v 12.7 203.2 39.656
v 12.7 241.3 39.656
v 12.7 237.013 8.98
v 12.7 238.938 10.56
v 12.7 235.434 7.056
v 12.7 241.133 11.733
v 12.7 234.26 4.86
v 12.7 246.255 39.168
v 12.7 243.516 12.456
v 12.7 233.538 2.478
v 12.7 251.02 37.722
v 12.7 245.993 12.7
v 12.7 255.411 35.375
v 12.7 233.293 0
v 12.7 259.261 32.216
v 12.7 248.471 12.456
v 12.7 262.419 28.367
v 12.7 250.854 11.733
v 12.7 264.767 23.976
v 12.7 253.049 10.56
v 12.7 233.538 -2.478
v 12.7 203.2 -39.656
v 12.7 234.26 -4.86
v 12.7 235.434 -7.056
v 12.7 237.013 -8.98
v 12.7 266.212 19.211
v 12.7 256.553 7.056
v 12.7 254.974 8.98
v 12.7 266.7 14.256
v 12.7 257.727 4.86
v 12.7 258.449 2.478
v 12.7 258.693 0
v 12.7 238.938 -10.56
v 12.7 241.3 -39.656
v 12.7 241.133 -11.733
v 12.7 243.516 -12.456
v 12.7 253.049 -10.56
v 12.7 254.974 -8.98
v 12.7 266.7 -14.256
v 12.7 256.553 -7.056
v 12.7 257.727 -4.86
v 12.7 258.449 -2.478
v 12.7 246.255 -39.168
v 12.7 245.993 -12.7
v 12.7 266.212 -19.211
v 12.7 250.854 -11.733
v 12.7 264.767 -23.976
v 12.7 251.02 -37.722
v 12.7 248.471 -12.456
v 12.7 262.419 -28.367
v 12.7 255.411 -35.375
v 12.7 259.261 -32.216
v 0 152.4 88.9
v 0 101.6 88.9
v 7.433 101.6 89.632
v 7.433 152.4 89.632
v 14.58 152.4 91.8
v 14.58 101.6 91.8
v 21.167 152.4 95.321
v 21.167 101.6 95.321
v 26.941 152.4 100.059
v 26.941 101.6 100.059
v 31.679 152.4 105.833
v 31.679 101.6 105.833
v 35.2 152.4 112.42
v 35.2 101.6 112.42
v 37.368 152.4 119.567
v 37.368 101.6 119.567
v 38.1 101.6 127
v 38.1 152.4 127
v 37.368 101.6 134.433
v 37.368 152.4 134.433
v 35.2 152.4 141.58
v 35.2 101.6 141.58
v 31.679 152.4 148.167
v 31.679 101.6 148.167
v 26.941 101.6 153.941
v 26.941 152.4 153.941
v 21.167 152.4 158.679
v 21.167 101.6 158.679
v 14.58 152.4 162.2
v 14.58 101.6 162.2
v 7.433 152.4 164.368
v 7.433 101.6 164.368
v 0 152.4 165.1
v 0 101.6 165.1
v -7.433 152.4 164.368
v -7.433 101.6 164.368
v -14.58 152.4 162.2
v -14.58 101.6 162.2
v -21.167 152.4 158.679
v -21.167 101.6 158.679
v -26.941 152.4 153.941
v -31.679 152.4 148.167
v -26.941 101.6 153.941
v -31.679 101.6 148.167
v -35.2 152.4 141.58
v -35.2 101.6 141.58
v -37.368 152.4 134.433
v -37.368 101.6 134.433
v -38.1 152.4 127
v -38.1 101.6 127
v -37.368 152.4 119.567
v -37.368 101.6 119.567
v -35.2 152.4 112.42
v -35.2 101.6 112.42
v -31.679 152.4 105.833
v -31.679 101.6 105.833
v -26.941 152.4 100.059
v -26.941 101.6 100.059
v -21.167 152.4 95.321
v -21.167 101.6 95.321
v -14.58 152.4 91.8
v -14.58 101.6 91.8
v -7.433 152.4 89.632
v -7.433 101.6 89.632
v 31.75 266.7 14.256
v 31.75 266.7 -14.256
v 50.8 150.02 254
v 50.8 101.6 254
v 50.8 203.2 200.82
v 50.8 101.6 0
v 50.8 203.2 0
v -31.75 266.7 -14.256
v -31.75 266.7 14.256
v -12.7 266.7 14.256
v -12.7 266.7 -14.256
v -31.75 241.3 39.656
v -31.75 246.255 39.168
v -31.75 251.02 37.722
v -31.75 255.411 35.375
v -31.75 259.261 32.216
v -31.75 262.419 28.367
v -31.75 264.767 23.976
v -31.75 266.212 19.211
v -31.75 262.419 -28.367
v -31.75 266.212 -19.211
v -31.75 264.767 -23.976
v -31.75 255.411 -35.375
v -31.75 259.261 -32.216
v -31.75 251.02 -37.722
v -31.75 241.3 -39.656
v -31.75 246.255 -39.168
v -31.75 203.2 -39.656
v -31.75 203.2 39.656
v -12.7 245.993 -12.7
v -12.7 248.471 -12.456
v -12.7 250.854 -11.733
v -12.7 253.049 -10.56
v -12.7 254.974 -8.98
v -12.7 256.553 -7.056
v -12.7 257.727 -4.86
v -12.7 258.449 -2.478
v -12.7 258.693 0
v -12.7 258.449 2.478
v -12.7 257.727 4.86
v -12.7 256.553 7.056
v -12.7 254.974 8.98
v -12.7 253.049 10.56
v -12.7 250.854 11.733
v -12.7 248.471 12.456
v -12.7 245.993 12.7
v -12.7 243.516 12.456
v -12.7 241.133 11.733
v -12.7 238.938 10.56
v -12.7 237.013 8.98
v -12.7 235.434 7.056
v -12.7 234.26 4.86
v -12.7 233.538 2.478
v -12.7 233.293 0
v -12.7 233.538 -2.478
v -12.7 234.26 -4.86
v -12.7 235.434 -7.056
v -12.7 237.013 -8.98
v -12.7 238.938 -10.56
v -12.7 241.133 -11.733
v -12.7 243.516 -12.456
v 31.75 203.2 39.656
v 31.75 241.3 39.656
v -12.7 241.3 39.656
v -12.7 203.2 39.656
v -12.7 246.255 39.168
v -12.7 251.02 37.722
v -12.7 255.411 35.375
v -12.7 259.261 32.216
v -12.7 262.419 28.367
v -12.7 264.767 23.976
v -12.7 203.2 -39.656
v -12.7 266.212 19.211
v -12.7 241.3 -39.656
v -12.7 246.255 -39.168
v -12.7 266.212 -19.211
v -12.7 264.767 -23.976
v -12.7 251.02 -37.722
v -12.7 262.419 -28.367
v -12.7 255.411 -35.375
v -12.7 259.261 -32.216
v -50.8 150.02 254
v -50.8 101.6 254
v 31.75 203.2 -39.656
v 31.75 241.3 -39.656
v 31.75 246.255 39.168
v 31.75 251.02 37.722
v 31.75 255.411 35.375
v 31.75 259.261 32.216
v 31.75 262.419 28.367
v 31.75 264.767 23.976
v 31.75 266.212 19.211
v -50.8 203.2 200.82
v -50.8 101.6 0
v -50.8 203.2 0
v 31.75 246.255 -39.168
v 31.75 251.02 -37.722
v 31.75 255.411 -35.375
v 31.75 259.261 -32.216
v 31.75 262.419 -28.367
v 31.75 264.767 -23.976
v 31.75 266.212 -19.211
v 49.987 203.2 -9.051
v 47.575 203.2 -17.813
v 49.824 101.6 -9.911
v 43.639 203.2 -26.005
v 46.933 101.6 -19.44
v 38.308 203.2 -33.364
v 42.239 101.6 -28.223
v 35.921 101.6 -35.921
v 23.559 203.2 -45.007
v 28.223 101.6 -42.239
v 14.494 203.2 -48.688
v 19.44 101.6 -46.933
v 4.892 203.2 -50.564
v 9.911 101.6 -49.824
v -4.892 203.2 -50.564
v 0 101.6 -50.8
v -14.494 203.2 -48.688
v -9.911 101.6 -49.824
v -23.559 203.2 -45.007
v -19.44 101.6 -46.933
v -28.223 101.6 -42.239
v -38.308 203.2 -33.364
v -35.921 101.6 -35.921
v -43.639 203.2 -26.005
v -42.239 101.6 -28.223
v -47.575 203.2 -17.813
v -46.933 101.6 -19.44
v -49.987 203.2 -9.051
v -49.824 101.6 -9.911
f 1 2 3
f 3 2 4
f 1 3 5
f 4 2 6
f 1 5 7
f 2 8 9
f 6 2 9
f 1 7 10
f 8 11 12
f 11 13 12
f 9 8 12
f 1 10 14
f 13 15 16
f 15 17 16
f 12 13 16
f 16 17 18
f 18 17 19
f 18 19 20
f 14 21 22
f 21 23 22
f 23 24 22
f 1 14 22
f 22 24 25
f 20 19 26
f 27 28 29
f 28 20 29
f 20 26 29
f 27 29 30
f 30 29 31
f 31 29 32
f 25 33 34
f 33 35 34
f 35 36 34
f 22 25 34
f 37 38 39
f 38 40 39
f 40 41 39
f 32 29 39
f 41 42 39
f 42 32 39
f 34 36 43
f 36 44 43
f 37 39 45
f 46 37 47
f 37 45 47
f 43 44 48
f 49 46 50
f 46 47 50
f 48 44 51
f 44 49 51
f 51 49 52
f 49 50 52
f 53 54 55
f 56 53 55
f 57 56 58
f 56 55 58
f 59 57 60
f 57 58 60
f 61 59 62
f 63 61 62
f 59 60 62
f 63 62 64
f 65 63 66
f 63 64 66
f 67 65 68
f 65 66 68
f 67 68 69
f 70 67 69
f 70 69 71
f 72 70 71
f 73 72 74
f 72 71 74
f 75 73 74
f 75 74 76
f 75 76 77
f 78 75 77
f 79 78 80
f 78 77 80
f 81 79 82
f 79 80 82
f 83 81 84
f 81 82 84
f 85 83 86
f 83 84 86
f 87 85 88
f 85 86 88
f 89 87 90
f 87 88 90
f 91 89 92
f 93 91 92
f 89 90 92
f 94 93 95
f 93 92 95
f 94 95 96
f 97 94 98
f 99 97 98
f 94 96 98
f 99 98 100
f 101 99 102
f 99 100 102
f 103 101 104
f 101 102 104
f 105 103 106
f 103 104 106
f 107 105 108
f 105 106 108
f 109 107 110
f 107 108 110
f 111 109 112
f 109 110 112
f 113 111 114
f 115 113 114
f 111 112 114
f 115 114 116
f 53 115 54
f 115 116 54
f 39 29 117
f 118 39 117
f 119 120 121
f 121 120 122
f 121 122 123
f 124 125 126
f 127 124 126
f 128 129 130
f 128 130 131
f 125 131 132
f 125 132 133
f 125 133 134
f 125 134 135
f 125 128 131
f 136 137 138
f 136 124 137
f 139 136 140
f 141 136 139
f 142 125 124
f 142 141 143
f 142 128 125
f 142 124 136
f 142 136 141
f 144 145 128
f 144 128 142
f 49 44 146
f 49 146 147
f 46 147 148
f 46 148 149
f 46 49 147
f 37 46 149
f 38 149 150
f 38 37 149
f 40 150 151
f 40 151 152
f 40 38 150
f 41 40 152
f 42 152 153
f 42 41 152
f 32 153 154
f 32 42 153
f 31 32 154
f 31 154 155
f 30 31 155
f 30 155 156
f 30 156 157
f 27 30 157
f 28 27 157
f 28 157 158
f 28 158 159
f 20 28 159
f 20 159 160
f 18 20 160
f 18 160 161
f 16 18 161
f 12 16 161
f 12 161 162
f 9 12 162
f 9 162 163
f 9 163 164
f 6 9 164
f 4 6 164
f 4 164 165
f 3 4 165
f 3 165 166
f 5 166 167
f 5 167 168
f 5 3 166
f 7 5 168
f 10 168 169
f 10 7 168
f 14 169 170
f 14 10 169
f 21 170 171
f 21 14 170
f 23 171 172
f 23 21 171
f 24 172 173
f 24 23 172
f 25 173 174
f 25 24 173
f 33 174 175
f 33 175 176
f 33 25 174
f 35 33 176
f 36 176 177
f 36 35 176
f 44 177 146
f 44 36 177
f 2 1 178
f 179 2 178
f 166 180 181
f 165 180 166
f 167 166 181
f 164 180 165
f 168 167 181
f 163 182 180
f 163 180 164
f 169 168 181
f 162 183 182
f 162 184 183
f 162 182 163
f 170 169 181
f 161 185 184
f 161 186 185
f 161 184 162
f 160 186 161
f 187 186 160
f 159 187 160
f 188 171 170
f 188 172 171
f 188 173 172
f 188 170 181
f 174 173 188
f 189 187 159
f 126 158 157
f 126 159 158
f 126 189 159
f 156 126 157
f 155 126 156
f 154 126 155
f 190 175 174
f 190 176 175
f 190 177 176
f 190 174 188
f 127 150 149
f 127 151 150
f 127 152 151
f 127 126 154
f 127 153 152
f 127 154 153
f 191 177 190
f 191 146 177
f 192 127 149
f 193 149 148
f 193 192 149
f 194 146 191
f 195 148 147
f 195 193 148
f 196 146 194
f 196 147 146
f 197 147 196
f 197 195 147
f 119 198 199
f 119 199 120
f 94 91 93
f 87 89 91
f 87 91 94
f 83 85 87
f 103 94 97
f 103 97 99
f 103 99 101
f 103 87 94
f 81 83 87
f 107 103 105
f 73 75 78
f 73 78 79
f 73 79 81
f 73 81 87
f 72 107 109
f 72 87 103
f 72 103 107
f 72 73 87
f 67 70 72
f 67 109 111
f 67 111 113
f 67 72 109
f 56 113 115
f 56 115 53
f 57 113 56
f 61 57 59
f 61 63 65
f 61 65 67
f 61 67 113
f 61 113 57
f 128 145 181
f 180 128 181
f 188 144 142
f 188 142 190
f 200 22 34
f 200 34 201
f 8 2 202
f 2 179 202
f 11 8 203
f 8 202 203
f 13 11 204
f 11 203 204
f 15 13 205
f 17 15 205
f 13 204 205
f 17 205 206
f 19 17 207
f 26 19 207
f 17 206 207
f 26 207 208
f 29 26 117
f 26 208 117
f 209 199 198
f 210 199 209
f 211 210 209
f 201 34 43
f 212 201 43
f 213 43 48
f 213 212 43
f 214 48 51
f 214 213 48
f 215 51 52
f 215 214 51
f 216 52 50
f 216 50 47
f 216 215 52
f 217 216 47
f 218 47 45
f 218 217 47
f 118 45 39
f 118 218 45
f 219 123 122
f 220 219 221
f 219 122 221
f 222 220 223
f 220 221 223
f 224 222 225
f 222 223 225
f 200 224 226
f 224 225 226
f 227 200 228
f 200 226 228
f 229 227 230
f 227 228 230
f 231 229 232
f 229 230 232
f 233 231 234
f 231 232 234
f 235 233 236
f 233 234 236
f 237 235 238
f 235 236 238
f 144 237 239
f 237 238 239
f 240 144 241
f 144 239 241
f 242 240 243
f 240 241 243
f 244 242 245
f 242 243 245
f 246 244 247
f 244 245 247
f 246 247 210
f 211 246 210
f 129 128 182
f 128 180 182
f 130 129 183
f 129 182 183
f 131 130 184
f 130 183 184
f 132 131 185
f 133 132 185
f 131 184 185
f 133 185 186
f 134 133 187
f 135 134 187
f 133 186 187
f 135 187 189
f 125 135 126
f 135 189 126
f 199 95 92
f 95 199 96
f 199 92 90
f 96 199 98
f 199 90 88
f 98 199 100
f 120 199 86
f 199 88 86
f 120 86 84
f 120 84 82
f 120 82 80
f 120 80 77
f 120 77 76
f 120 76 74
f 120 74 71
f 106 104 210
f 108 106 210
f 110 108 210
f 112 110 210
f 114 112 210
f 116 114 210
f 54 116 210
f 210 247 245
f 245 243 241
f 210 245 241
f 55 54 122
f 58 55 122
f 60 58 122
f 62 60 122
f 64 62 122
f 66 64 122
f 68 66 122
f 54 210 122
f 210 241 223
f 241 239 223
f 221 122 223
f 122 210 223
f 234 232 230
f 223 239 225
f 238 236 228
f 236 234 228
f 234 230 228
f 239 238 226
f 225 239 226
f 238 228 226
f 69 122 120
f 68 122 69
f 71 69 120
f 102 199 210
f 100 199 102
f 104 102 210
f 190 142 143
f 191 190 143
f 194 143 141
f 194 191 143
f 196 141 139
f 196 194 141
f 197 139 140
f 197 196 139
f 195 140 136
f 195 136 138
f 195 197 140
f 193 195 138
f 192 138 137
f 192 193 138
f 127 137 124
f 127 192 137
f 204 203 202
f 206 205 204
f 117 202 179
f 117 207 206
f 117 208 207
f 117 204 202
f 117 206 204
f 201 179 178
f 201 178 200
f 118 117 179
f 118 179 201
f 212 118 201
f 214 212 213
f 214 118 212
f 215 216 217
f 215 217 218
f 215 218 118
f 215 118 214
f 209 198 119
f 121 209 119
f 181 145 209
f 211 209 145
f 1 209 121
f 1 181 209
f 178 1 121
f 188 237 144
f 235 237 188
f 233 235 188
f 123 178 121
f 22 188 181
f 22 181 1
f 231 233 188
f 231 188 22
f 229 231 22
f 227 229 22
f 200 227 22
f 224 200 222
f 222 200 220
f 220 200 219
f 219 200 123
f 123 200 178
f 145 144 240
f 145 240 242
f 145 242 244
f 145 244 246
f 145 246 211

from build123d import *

# Parameters (mm, degrees)
SKETCH1_R           = 50.8
BOSS_EXTRUDE1_DEPTH = 203.2
SKETCH2_W           = 63.5
SKETCH2_H           = 79.31147458
BOSS_EXTRUDE2_DEPTH = 63.5
SKETCH3_W           = 25.4
SKETCH3_H           = 79.31147458
CUT_EXTRUDE1_DEPTH  = 63.5
FILLET1_R           = 25.4
SKETCH4_R           = 31.75
CUT_EXTRUDE2_DEPTH  = 63.5
SKETCH6_W           = 101.6
SKETCH6_H           = 101.6
BOSS_EXTRUDE3_DEPTH = 254
SKETCH7_W           = 106.066491774
SKETCH7_H           = 101.6
CUT_EXTRUDE4_DEPTH  = 409.182030472
CHAMFER2_SIZE       = 53.18
SKETCH5_R           = 12.7
BOSS_EXTRUDE5_DEPTH = 53.34
SKETCH11_R          = 38.1
CUT_EXTRUDE7_DEPTH  = 50.8


with BuildPart() as part:
    # Sketch1 → Boss-Extrude1 (new body)
    with BuildSketch(Plane(origin=(0, 0, 0), x_dir=(1, 0, 0), z_dir=(0, 1, 0))):
        with Locations(Location((0, 0, 0), (0, 0, 270))):
            Circle(SKETCH1_R)
    extrude(amount=BOSS_EXTRUDE1_DEPTH)

    # Sketch2 → Boss-Extrude2 (add)
    with BuildSketch(Plane(origin=(0, 203.2, 0), x_dir=(1, 0, 0), z_dir=(0, 1, 0))):
        Rectangle(SKETCH2_W, SKETCH2_H)
    extrude(amount=BOSS_EXTRUDE2_DEPTH)

    # Sketch3 → Cut-Extrude1 (cut)
    with BuildSketch(Plane(origin=(0, 266.7, 0), x_dir=(1, 0, 0), z_dir=(0, 1, 0))):
        Rectangle(SKETCH3_W, SKETCH3_H)
    extrude(amount=-CUT_EXTRUDE1_DEPTH, mode=Mode.SUBTRACT)

    # Fillet1
    fillet1_edges = [part.edges().sort_by_distance(p)[0] for p in [
        (22.225, 266.7, -39.65573729),
        (-22.225, 266.7, 39.65573729),
        (-22.225, 266.7, -39.65573729),
        (22.225, 266.7, 39.65573729),
    ]]
    fillet(fillet1_edges, radius=FILLET1_R)

    # Sketch4 → Cut-Extrude2 (cut)
    with BuildSketch(Plane.XZ):
        with Locations(Location((0, 0, 0), (0, 0, 270))):
            Circle(SKETCH4_R)
    extrude(amount=-CUT_EXTRUDE2_DEPTH, mode=Mode.SUBTRACT)

    # Sketch6 → Boss-Extrude3 (add)
    with BuildSketch(Plane.XY):
        with Locations((0, 152.4)):
            Rectangle(SKETCH6_W, SKETCH6_H)
    extrude(amount=BOSS_EXTRUDE3_DEPTH)

    # Sketch7 → Cut-Extrude4 (cut, through all)
    with BuildSketch(Plane.XY.offset(254)):
        with Locations((2.233245887, 50.8)):
            Rectangle(SKETCH7_W, SKETCH7_H)
    extrude(amount=-CUT_EXTRUDE4_DEPTH, mode=Mode.SUBTRACT)

    # Chamfer2
    chamfer2_edges = [part.edges().sort_by_distance(p)[0] for p in [
        (0, 203.2, 254),
    ]]
    chamfer(chamfer2_edges, length=CHAMFER2_SIZE)

    # Sketch5 → Boss-Extrude5 (add)
    with BuildSketch(Plane(origin=(31.75, 0, 0), x_dir=(0, 0, -1), z_dir=(1, 0, 0))):
        with Locations((0, 245.993497046)):
            Circle(SKETCH5_R)
    extrude(amount=-BOSS_EXTRUDE5_DEPTH)

    # Sketch11 → Cut-Extrude7 (cut)
    with BuildSketch(Plane.XZ.offset(-101.6)):
        with Locations(Location((0, 127, 0), (0, 0, 270))):
            Circle(SKETCH11_R)
    extrude(amount=-CUT_EXTRUDE7_DEPTH, mode=Mode.SUBTRACT)


solid = part.part
